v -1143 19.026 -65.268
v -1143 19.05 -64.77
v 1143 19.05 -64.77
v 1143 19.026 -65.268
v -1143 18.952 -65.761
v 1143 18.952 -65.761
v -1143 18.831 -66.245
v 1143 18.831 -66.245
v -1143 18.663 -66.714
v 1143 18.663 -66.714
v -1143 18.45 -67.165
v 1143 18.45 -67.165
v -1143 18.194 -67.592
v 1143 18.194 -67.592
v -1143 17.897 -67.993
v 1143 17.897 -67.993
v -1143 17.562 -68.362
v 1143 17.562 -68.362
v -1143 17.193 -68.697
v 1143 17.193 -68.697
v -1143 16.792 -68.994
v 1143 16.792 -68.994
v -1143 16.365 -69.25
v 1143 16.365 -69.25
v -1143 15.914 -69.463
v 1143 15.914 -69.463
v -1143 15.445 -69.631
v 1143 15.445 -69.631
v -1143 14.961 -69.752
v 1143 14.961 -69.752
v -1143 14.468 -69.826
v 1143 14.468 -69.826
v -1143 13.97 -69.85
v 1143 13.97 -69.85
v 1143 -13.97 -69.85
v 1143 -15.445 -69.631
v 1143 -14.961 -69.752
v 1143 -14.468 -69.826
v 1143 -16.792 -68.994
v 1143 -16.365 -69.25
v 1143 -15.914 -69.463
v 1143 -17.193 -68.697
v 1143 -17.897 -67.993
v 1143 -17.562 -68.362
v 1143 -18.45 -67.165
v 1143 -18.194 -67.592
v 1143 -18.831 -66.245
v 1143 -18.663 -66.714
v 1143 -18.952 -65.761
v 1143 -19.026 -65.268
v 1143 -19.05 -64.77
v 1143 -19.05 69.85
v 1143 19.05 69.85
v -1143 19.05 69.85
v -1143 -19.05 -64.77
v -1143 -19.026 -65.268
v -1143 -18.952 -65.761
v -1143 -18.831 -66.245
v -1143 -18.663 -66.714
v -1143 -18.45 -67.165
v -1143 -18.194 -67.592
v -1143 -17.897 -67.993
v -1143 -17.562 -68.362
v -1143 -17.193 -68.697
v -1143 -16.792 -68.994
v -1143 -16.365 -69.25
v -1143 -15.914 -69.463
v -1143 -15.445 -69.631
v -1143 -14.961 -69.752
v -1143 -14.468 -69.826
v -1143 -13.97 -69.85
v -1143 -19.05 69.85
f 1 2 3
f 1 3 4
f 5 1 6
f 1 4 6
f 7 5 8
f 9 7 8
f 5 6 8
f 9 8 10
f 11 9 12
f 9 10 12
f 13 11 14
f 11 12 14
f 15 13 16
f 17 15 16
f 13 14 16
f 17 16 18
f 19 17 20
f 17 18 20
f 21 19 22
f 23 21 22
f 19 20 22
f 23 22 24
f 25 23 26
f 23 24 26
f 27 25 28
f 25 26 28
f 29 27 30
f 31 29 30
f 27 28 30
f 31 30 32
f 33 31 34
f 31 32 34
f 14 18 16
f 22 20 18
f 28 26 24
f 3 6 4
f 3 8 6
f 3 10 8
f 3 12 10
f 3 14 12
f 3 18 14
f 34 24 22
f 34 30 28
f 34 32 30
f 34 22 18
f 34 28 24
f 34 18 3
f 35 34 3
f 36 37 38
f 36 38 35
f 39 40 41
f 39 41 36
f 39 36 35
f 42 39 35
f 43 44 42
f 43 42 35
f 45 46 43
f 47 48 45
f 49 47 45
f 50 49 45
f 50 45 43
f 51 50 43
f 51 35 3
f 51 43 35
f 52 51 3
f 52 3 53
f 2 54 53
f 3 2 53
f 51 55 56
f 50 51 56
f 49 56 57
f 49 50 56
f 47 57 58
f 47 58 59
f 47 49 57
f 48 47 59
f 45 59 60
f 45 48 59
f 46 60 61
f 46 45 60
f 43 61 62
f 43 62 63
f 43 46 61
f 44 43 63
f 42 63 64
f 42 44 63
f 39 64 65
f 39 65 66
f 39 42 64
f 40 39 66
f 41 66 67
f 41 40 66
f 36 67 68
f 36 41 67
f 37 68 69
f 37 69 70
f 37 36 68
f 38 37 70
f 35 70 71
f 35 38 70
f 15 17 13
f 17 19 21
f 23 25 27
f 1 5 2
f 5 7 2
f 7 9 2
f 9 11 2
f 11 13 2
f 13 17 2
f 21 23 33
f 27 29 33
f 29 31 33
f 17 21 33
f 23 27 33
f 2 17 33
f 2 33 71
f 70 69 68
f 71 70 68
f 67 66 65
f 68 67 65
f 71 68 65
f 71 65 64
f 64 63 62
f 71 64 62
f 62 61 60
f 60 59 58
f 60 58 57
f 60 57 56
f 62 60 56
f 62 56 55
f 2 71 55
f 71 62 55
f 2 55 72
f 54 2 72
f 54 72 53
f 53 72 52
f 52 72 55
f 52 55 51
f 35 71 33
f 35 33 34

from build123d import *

# Parameters (mm, degrees)
F0_W          = 2286
F0_H          = 139.7
F1_DEPTH      = 19.05
F1_DEPTH_BACK = 19.05
F2_R          = 5.08


with BuildPart() as f1:
    # F0 (on Front) → F1 (new body, two sides)
    with BuildSketch(Plane.XZ) as f1_sk:
        Rectangle(F0_W, F0_H)
    extrude(amount=F1_DEPTH)
    extrude(f1_sk.sketch, amount=-F1_DEPTH_BACK)

    # F2
    f2_edges = [f1.edges().sort_by_distance(p)[0] for p in [
        (0, -19.05, -69.85),
        (0, 19.05, -69.85),
    ]]
    fillet(f2_edges, radius=F2_R)


solid = f1.part
